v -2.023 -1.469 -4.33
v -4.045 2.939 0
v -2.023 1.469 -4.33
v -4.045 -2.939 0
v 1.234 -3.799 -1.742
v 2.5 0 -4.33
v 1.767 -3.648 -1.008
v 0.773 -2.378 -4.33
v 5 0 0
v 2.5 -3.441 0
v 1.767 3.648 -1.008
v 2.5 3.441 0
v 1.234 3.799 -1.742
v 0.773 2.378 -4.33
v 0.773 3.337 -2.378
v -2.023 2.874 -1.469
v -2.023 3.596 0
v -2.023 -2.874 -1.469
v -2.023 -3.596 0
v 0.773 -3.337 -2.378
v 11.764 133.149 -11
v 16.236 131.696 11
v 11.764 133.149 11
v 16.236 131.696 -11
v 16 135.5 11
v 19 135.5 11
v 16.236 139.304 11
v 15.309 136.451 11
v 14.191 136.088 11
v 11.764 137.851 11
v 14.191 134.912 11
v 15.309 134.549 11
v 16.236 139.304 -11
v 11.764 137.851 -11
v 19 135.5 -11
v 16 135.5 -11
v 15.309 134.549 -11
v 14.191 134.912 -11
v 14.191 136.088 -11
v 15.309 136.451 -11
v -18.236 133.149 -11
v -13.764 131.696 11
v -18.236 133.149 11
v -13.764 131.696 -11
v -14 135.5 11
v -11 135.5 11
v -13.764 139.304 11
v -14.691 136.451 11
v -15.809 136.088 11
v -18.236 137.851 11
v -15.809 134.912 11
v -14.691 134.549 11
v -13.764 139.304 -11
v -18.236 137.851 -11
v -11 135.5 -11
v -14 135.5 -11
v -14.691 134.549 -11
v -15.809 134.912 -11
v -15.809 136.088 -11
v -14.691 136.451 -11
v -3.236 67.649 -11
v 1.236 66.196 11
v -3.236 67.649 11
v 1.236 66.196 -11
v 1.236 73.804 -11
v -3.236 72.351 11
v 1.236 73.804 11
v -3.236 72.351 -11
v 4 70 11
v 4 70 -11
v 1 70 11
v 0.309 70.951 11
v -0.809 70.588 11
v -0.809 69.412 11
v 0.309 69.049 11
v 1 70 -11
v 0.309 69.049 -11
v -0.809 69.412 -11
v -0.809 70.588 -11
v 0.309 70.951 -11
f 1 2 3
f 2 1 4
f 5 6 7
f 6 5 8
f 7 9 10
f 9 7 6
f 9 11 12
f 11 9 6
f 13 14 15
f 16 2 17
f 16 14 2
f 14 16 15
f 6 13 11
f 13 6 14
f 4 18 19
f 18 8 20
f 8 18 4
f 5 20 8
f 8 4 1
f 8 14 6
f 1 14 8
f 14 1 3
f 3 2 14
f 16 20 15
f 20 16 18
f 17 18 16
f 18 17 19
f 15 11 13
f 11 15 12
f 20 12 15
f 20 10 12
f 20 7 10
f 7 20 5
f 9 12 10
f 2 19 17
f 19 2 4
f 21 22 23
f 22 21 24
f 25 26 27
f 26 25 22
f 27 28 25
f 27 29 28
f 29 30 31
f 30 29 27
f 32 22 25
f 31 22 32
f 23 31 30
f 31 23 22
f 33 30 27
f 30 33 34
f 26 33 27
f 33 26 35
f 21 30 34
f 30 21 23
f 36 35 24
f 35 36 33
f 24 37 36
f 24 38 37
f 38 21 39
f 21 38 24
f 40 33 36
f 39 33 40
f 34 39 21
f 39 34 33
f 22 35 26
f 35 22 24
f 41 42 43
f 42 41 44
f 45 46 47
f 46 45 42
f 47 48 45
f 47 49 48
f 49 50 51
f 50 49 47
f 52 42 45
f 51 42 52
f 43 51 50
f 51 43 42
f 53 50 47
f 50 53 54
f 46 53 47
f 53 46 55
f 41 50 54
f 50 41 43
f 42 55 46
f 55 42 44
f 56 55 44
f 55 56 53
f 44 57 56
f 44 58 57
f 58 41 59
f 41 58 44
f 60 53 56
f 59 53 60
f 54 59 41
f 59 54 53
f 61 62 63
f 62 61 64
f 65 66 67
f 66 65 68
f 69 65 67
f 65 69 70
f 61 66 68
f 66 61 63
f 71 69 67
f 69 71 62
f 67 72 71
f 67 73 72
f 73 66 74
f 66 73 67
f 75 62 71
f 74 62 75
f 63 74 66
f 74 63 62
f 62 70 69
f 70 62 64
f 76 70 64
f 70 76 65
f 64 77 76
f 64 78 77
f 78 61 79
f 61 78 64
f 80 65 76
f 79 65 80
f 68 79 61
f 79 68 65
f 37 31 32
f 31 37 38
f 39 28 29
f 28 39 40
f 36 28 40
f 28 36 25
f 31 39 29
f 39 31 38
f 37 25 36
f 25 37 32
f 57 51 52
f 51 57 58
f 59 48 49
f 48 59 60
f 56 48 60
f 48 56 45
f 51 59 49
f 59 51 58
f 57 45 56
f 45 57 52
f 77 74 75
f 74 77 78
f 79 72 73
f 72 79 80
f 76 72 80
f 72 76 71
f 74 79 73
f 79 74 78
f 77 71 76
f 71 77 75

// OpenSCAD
// file: M2_holes.scad
module M2(x,y){
translate([x,y,0])
	union(){
		translate([0,0,0]) cylinder(h=30,r=1,center=true);
		translate([0,0,12.5]) cylinder(h=15,r=3);
		translate([0,0,-12.5]) rotate([180,0,0])cylinder(h=15,r=3);
	}

}
// main file
include <M2_holes.scad>
$fn = 5;

// Make the bolts distribute symmetrically autmatically
module M2_2(x,y)
{
	M2(x,y);
	M2(-x,y);
}

// Make the bolts distribute symmetrically autmatically
module poles(x,y)
{
	translate([x,y,0]) cylinder(h = 22, r = 4, center = true);
	translate([-x,y,0]) cylinder(h = 22, r = 4, center = true);

}

// Define the usb rfid reader
module reader(scale)
{
	//difference(){
	union(){
		cube([55,11,23],center=true);
		translate([25,0,0])cube([55,7,15],center=true);
	}
   //rotate([0,45,0])translate([32.5,0,0])cube([55,11,23],center=true);
   //}
}

difference(){
	union(){
		difference(){
			minkowski(){
              // Traced probe, extrude
				linear_extrude(height = 20, center = true) import_dxf(file = "drawing.dxf");
				sphere(5);
			}
			translate([0,0,12.5]) linear_extrude(height = 20) import_dxf(file = "logo.dxf");
			linear_extrude(height = 20, center = true) import_dxf(file = "drawing.dxf");
          // Hole near base for USB cable inlet
			rotate([90,0,0]) cylinder(r=2.5, h=20, center = true);
          // Hole near head for USB cable outlet
			translate([56,120,0]) rotate([0,90,0]) cylinder(r=2.5, h=20, center = true);

			//translate([75,160,0]) cube([25,40,15], center = true);
		
			// Fastener holes
			M2_2(18,2);
			M2_2(31,40);
			M2_2(34,86);
			M2_2(56.5,110);
			M2_2(42,140);
		
			// Make a slot for the rfid reader
			translate([0,145,0]) reader(1);
          // Cut it in half for printing
		  	translate([-80,-50,0]) cube([320,320,50]);
		}
		   poles(15,135.5);
		   poles(0,70);
		
		}
   M2_2(15,135.5);
   M2_2(0,70);
}
